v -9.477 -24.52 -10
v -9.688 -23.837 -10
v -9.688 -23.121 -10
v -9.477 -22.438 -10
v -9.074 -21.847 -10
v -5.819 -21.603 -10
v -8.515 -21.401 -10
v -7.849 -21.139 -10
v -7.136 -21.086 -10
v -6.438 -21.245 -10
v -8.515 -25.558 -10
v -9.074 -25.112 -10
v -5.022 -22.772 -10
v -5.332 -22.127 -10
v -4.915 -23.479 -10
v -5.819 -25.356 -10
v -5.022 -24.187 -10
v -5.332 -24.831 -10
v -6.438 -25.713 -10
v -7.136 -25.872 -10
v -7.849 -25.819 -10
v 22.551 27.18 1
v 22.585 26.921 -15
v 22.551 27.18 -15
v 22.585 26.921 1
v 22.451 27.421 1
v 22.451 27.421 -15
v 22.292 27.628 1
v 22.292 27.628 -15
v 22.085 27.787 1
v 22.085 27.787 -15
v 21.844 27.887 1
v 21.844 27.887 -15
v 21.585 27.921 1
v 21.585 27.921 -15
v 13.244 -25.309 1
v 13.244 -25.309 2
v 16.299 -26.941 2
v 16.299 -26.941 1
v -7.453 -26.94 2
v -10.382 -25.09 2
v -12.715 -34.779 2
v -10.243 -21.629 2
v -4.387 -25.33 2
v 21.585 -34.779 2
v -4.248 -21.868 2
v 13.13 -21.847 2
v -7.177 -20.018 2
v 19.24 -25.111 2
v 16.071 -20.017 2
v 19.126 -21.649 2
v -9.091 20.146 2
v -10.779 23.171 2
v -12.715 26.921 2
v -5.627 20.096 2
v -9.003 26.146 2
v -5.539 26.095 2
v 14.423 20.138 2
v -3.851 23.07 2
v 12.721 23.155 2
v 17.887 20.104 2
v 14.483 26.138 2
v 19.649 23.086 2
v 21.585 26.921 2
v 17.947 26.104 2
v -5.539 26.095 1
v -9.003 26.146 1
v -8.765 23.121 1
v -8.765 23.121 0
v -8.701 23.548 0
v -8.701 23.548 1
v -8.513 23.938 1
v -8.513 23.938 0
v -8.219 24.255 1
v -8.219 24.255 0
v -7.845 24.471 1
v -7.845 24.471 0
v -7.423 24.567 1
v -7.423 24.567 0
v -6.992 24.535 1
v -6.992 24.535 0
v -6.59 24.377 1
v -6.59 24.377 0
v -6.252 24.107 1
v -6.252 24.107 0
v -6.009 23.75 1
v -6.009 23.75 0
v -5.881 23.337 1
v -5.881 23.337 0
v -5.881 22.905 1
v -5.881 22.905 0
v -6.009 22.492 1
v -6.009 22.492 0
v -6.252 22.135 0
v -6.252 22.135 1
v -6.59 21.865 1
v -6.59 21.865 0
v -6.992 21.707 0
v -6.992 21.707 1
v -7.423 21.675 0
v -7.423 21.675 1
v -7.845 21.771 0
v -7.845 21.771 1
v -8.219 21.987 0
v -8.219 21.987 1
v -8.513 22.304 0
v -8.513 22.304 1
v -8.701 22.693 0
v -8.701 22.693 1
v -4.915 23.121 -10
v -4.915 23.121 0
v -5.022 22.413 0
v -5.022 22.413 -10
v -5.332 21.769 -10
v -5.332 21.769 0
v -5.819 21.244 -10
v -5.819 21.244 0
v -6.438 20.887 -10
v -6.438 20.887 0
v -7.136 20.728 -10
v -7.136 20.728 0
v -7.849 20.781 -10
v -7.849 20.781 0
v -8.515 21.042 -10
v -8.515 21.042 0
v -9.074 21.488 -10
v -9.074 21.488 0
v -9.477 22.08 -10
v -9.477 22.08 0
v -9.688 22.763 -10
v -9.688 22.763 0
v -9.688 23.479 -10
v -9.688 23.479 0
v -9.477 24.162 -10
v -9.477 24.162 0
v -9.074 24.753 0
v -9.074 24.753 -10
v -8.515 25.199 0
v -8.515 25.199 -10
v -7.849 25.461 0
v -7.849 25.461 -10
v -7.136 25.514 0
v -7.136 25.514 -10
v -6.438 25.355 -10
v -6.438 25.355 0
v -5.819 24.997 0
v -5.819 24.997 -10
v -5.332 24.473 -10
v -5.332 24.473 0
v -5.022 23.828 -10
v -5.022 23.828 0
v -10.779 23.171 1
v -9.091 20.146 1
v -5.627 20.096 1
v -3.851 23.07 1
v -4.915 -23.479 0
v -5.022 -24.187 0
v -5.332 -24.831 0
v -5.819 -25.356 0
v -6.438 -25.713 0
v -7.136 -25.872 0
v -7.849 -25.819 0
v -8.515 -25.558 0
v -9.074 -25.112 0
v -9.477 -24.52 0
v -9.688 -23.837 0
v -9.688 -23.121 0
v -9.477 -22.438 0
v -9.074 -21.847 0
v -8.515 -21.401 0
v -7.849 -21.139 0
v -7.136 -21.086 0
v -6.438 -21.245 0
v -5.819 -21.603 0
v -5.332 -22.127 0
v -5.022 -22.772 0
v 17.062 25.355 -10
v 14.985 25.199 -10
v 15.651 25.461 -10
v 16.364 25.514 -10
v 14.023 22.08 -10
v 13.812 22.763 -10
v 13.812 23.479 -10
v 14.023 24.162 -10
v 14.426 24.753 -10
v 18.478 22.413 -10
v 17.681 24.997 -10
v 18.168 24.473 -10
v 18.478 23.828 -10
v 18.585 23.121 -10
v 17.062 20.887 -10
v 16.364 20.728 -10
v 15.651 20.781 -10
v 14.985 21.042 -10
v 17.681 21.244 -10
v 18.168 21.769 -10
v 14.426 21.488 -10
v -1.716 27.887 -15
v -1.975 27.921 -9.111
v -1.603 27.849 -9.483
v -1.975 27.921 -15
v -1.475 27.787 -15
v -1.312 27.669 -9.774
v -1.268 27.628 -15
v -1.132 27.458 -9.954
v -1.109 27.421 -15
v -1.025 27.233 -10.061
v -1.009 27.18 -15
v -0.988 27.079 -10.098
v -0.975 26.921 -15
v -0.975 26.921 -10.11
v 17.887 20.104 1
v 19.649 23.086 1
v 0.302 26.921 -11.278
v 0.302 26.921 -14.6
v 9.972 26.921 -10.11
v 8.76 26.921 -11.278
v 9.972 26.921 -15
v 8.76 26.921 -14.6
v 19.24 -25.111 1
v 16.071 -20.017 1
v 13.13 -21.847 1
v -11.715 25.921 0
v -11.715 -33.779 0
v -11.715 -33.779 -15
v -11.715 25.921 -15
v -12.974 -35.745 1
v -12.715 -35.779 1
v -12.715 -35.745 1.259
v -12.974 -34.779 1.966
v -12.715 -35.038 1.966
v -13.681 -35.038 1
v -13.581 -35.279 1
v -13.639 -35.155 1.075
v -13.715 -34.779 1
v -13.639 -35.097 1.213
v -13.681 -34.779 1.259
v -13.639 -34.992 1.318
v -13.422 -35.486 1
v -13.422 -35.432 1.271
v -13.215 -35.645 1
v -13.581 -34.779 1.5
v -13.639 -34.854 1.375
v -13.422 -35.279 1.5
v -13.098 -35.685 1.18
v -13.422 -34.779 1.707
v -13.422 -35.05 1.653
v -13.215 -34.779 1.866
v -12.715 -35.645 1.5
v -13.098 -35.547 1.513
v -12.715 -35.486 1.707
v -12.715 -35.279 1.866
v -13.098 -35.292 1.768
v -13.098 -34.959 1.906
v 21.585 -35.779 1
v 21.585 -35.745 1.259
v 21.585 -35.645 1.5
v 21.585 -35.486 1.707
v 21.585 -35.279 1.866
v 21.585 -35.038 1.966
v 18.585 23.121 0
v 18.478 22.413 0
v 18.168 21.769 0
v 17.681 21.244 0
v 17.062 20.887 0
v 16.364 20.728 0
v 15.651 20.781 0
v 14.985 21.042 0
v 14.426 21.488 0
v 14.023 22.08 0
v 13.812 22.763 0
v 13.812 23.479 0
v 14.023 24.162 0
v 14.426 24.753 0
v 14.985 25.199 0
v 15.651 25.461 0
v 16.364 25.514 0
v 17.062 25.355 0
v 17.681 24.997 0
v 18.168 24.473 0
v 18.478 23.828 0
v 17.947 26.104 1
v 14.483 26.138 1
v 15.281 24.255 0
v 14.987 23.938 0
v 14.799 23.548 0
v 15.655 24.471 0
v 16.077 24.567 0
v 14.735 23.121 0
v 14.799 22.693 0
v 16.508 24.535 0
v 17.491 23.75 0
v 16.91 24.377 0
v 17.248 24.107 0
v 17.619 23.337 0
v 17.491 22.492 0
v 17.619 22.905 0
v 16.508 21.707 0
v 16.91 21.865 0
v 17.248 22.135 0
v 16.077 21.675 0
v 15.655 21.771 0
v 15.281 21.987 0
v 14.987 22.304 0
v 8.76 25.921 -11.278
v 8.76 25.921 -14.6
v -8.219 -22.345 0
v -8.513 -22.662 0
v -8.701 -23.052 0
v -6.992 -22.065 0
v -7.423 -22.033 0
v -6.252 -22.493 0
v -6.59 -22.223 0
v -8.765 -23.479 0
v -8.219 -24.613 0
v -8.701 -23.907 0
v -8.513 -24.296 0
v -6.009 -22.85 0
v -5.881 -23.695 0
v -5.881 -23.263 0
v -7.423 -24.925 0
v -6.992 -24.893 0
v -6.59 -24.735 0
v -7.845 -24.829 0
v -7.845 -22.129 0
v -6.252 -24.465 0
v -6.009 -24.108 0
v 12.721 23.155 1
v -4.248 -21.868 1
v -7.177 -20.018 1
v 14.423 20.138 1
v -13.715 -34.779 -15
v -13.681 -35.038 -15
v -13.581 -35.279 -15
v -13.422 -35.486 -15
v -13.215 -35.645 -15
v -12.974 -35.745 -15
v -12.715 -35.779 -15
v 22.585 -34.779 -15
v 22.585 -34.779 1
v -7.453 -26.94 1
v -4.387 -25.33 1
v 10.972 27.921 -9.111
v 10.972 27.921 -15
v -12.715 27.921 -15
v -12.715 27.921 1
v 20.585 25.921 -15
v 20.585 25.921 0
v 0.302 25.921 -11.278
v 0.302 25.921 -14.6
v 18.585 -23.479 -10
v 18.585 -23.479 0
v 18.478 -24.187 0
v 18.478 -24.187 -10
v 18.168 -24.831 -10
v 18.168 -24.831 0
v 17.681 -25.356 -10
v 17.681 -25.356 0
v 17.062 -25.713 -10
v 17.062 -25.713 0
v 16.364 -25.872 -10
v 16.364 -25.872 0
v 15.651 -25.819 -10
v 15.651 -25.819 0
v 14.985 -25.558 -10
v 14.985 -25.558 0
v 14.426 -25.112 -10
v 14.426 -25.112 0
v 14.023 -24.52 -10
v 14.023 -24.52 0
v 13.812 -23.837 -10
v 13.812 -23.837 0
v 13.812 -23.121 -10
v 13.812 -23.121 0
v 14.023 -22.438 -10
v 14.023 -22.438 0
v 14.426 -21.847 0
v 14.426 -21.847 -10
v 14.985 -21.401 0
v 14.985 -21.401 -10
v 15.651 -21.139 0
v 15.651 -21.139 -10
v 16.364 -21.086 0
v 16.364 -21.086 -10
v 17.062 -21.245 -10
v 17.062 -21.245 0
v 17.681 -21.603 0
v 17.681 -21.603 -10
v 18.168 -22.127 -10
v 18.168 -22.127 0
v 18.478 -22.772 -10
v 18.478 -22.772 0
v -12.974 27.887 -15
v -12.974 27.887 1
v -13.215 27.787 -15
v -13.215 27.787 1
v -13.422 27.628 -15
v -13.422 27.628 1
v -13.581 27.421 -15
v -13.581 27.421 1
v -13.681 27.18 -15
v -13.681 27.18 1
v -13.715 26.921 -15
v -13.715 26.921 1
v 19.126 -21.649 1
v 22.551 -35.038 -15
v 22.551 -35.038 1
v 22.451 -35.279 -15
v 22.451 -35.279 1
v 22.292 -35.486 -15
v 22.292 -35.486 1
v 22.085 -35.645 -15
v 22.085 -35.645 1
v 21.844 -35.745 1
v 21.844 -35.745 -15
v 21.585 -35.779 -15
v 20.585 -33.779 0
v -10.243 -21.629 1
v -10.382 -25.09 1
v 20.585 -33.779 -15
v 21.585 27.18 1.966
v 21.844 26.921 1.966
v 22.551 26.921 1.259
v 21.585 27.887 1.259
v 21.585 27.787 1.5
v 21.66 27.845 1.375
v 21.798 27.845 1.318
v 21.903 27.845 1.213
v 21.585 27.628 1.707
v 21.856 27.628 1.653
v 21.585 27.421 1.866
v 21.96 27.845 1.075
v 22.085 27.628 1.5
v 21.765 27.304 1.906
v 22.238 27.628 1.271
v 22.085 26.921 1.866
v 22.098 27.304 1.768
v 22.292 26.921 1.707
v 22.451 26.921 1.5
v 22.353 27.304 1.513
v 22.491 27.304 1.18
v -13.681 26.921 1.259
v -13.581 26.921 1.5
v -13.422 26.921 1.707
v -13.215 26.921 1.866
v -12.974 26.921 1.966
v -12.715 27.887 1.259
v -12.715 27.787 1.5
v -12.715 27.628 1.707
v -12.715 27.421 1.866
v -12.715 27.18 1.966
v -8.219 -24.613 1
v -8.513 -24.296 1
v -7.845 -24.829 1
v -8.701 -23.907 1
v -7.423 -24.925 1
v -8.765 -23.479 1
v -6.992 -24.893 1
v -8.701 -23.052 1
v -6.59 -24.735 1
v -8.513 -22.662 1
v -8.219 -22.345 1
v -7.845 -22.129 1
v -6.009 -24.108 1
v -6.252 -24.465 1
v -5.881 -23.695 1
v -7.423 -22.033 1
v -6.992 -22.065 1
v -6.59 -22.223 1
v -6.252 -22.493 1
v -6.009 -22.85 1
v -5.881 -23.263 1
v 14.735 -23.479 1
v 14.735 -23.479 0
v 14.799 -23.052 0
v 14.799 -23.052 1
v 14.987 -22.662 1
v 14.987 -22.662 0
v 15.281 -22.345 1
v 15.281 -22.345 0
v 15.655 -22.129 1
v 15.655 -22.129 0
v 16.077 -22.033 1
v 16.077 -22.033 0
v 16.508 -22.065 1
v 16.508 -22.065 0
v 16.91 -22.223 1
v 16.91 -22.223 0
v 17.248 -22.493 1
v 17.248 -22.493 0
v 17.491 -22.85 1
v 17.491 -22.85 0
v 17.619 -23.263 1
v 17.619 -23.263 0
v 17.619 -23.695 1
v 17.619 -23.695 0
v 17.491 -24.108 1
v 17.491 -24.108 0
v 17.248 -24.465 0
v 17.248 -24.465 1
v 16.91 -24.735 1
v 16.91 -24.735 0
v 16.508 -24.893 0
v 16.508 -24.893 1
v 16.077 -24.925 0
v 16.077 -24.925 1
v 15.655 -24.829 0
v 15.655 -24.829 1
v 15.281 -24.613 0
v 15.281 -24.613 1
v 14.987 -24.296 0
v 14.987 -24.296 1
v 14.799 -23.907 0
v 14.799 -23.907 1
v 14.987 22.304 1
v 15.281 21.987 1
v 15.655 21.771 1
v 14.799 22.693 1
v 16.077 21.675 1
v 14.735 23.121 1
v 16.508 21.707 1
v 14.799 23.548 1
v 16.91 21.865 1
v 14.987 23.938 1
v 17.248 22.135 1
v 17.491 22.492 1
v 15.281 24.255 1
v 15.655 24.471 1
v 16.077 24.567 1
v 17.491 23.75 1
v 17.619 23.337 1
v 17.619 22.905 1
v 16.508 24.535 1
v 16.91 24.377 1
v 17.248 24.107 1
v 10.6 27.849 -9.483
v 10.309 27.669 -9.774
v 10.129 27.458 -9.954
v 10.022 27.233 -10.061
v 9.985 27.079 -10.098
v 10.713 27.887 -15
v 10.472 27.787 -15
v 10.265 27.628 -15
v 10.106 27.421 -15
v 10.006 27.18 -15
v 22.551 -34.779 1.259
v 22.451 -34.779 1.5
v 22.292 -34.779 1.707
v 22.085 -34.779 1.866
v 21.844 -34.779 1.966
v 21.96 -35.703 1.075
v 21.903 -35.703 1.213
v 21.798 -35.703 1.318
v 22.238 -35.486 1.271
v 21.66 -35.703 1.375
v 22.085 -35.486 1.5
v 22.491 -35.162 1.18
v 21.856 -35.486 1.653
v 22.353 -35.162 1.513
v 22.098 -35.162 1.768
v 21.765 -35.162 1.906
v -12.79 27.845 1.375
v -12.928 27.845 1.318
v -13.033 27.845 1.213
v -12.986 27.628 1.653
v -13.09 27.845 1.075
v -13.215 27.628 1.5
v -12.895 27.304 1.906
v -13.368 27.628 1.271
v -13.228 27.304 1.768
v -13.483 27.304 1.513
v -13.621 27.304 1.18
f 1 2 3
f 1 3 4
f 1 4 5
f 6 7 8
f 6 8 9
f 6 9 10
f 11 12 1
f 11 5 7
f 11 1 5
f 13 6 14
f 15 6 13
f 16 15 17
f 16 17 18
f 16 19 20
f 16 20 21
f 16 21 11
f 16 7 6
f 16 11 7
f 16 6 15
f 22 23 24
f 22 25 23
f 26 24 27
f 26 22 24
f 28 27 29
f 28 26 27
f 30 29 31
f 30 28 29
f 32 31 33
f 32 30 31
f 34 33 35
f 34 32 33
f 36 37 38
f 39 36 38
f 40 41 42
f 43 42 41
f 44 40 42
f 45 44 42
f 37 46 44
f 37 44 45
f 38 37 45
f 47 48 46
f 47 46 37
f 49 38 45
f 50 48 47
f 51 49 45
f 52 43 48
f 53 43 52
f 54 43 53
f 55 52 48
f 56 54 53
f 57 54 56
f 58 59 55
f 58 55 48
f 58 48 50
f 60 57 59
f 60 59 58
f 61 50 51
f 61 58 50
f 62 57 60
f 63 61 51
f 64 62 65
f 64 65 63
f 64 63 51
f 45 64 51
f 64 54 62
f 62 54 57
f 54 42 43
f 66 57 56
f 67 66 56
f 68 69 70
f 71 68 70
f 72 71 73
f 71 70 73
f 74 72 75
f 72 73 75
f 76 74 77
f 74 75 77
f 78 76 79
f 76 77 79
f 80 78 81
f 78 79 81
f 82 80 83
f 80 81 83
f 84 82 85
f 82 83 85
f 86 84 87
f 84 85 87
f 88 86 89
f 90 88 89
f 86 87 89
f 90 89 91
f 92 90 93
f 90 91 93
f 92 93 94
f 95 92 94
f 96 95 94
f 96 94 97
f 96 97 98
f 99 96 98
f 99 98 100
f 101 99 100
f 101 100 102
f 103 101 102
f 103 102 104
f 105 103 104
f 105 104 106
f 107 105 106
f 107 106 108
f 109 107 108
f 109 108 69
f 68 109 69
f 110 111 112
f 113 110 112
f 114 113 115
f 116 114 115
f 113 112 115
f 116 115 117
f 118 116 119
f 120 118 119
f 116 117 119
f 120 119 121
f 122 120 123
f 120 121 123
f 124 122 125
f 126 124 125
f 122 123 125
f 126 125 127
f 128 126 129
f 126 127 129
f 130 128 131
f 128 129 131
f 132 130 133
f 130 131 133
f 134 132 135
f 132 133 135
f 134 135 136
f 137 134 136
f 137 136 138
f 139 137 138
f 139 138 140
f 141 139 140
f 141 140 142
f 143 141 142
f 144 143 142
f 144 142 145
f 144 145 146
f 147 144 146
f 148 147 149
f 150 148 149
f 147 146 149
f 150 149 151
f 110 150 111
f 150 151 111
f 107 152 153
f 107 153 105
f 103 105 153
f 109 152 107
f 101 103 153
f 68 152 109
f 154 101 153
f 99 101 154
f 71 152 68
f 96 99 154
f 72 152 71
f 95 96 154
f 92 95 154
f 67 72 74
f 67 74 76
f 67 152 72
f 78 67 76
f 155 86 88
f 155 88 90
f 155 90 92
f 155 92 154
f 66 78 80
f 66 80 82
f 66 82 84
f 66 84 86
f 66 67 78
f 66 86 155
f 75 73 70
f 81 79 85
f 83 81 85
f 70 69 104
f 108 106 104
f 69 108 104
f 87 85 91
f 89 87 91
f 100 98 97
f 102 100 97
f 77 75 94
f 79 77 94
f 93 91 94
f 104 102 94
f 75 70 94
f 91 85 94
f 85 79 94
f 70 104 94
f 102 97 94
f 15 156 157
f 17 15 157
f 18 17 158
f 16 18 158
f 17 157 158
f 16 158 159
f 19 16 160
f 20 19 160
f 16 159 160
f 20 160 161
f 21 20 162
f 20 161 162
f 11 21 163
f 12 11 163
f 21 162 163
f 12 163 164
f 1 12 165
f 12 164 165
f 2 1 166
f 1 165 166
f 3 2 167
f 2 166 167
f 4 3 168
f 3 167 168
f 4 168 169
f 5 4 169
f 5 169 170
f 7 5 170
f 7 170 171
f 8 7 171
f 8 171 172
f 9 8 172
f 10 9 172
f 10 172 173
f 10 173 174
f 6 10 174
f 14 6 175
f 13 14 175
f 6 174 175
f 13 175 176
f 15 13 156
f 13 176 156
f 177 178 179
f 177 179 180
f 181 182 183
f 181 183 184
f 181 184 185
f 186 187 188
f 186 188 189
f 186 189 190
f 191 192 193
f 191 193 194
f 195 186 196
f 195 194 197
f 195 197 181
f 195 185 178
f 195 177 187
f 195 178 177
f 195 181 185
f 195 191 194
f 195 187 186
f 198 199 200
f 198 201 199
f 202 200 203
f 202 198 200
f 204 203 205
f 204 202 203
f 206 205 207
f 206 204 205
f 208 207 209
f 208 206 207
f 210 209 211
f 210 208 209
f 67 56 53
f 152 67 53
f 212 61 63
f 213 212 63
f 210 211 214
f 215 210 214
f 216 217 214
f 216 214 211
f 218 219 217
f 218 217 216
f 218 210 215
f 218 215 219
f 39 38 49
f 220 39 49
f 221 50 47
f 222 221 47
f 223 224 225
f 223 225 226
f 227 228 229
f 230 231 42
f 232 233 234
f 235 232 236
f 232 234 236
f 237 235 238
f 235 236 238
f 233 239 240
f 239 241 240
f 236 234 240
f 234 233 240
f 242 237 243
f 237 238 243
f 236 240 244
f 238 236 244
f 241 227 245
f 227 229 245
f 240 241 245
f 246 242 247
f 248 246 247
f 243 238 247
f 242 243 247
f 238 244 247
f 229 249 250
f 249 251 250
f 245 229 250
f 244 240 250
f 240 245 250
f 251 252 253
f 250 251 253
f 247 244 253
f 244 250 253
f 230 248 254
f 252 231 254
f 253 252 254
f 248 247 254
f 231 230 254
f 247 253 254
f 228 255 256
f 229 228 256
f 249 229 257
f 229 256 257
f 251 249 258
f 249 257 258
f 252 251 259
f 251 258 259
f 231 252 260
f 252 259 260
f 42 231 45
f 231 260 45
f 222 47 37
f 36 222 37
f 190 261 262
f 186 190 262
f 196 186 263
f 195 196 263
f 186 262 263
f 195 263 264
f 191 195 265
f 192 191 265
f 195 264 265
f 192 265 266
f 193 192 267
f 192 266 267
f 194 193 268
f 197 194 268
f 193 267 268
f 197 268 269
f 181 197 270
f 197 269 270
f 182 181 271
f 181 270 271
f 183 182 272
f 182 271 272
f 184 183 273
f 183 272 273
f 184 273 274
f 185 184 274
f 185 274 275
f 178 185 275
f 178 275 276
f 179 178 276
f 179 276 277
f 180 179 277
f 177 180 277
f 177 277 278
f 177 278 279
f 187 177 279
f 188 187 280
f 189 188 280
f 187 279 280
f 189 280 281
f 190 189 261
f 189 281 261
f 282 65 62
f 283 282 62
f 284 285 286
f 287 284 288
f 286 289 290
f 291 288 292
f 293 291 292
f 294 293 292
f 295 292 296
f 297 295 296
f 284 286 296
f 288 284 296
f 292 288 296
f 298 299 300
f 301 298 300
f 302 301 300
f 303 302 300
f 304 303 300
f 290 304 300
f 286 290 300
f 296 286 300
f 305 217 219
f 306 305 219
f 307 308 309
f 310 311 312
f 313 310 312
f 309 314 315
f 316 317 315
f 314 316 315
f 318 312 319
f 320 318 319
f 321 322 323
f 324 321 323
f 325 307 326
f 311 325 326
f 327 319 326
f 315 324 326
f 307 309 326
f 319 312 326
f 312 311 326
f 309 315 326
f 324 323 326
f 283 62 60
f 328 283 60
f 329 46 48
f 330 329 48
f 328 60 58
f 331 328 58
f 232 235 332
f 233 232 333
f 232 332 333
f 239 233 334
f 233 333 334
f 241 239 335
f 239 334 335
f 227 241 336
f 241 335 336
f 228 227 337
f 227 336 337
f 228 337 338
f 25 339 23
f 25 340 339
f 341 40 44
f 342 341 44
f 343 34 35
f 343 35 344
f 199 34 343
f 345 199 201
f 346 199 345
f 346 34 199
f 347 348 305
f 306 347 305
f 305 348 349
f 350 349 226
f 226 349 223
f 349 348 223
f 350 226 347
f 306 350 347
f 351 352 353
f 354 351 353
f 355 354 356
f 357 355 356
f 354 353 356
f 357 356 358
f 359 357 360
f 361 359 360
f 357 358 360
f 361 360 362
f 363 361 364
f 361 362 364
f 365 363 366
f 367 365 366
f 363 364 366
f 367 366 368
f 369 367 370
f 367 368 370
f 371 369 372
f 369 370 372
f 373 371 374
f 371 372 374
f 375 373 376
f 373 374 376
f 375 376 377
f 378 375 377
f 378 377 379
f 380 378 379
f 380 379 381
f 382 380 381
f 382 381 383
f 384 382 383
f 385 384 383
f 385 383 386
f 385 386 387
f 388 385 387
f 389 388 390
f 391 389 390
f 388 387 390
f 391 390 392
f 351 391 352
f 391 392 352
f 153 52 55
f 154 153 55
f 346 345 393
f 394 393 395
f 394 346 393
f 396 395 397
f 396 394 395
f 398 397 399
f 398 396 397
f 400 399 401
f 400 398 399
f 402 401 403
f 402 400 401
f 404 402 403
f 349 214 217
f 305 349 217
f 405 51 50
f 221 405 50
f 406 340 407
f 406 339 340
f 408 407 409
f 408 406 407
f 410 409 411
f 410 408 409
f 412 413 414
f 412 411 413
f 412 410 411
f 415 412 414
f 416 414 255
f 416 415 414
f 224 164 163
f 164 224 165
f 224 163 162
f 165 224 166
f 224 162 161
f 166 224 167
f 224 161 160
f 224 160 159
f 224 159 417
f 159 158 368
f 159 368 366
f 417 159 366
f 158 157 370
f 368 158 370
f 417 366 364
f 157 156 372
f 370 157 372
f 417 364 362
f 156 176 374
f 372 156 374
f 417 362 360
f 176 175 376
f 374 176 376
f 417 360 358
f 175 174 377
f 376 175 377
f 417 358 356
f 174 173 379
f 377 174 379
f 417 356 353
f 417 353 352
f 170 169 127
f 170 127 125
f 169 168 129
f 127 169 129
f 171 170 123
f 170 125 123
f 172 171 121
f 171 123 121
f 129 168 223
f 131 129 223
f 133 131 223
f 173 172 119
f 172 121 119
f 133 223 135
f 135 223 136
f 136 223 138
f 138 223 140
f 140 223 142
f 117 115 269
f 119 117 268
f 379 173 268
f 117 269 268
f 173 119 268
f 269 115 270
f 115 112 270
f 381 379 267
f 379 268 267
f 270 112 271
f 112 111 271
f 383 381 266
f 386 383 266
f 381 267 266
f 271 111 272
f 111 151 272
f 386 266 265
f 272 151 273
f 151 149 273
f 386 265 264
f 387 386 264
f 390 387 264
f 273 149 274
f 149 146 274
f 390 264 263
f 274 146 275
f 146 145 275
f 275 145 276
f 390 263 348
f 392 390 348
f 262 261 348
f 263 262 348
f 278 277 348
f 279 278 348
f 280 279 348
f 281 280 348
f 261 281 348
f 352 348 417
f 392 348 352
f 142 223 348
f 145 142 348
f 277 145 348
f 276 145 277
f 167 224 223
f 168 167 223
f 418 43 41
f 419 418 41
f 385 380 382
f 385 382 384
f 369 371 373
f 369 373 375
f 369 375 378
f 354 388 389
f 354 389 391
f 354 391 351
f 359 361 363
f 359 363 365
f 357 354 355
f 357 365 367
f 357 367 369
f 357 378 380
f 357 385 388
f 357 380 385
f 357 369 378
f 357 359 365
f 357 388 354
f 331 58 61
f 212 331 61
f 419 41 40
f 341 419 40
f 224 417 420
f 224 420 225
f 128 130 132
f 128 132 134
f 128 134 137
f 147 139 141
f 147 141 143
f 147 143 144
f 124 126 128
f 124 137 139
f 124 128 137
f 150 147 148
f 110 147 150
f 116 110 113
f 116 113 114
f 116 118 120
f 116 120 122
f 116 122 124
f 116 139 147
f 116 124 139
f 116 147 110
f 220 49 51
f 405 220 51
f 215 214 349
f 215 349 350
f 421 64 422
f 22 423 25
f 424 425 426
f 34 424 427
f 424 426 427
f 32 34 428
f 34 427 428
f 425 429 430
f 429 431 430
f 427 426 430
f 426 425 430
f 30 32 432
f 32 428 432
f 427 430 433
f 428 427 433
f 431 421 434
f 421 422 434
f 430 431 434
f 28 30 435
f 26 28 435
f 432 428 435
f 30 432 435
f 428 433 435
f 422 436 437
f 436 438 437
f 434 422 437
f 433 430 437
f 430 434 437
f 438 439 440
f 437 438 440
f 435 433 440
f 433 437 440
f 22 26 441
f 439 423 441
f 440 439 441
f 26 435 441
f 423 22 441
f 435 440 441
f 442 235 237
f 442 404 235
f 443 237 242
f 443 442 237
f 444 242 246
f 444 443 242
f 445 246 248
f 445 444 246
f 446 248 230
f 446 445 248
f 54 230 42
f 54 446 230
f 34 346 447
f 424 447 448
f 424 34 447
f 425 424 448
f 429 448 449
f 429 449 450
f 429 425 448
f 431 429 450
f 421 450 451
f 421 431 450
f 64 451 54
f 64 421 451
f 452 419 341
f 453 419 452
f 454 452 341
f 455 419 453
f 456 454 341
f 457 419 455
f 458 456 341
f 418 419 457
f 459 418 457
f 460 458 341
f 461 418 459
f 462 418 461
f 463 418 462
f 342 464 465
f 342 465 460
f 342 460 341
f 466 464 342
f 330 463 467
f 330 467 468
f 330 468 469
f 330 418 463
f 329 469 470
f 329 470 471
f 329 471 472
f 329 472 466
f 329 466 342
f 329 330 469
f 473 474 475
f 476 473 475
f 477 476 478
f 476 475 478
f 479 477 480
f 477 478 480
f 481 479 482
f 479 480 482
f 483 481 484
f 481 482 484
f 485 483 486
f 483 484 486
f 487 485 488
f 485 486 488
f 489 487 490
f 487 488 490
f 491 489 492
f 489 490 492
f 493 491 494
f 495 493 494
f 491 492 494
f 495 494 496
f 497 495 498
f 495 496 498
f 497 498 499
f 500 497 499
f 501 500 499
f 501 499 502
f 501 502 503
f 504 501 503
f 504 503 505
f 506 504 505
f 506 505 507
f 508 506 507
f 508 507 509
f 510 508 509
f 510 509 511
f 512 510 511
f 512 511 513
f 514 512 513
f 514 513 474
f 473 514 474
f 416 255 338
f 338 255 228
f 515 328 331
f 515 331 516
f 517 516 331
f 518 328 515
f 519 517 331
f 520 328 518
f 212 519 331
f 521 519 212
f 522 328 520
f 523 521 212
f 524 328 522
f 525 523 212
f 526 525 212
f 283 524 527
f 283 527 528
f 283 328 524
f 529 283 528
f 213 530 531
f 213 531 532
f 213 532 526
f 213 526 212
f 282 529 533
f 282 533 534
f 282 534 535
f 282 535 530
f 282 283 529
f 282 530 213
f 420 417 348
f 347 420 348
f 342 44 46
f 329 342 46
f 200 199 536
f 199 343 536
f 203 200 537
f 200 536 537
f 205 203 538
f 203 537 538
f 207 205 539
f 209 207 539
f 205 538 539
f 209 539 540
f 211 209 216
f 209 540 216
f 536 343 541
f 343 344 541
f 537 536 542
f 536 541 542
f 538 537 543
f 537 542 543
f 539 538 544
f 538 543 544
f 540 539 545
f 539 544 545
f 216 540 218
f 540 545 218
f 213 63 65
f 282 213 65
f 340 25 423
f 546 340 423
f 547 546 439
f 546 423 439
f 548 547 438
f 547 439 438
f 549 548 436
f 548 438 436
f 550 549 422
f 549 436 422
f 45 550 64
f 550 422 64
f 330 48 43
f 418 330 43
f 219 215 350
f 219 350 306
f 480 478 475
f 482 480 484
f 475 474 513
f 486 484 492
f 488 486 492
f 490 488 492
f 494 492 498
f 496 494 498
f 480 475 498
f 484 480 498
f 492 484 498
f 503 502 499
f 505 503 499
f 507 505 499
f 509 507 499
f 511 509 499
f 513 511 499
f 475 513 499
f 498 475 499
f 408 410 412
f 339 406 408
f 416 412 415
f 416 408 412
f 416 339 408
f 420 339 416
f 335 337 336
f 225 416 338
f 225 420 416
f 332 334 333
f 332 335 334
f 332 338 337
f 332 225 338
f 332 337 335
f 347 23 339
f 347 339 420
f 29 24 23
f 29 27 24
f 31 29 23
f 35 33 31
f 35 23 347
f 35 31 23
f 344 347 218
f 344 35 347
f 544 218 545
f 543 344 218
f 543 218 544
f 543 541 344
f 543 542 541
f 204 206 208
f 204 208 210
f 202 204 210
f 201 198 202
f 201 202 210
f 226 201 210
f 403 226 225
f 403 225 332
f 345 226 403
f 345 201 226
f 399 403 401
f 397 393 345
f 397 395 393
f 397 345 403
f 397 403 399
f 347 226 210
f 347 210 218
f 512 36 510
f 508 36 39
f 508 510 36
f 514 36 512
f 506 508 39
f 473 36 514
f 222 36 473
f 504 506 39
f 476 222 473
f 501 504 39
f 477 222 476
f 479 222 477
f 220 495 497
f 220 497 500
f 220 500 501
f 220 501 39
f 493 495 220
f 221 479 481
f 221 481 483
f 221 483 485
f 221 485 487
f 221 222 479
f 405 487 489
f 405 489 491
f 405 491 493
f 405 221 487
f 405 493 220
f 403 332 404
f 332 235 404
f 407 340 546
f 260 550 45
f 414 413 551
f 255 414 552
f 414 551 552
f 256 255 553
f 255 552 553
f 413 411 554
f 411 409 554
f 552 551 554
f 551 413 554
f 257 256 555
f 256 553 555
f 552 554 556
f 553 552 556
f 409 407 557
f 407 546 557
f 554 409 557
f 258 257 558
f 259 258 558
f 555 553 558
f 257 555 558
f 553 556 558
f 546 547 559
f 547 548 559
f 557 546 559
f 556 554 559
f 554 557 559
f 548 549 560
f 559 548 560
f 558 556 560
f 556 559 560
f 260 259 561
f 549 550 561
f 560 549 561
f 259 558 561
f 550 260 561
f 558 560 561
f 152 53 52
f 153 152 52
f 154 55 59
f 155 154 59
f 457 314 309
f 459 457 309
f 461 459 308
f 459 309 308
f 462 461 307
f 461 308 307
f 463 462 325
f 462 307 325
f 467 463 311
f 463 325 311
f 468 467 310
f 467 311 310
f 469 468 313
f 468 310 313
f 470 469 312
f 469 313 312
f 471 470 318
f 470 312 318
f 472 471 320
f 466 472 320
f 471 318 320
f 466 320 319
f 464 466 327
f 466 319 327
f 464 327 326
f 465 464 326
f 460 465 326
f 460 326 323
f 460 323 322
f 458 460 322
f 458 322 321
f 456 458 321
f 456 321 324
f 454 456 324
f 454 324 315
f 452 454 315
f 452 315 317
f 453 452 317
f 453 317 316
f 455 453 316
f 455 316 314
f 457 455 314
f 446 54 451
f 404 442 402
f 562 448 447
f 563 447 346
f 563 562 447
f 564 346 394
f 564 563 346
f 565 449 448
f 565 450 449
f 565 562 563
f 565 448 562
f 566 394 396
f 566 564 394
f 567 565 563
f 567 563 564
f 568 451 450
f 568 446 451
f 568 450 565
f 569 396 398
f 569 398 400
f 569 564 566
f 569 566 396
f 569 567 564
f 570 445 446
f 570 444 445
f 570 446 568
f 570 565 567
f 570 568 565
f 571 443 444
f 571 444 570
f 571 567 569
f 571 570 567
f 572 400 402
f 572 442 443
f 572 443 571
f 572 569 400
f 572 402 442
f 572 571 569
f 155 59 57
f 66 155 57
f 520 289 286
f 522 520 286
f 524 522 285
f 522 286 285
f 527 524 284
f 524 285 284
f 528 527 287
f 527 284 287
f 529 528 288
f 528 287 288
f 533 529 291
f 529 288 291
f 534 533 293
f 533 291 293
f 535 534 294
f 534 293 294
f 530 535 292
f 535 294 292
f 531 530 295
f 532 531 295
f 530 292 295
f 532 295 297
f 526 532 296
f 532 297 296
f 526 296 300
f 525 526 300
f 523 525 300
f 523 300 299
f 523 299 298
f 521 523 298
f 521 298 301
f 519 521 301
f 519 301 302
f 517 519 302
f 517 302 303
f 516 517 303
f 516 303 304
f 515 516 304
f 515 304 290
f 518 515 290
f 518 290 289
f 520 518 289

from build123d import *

# Parameters (mm, degrees)
CROQUIS1_W              = 36.3
CROQUIS1_H              = 63.7
SALIENTE_EXTRUIR1_DEPTH = 2
CROQUIS2_R              = 1.45
CORTAR_EXTRUIR1_DEPTH   = 43.35833467
CROQUIS3_W              = 36.3
CROQUIS3_H              = 63.7
CROQUIS3_W_2            = 32.3
CROQUIS3_H_2            = 59.7
SALIENTE_EXTRUIR2_DEPTH = 15
CROQUIS4_W              = 8.458215844
CROQUIS4_H              = 3.322323253
CORTAR_EXTRUIR2_DEPTH   = 15
CROQUIS5_W              = 10.947551138
CROQUIS5_H              = 4.889557179
CORTAR_EXTRUIR3_DEPTH   = 1
CROQUIS6_R              = 2.4
SALIENTE_EXTRUIR3_DEPTH = 10
REDONDEO1_R             = 1
CORTAR_EXTRUIR4_DEPTH   = 1


with BuildPart() as part:
    # Croquis1 → Saliente-Extruir1 (new body)
    with BuildSketch(Plane.XY):
        with Locations((4.435020115, -3.929119363)):
            Rectangle(CROQUIS1_W, CROQUIS1_H)
    extrude(amount=SALIENTE_EXTRUIR1_DEPTH)

    # Croquis2 → Cortar-Extruir1 (cut, through all)
    with BuildSketch(Plane(origin=(0, 0, 0), x_dir=(-1, 0, 0), z_dir=(0, 0, -1))):
        with Locations((-16.185020115, 23.120880637)):
            Circle(CROQUIS2_R)
        with Locations((7.314979885, 23.120880637)):
            Circle(CROQUIS2_R)
        with Locations((7.314979885, -23.479119363)):
            Circle(CROQUIS2_R)
        with Locations((-16.185020115, -23.479119363)):
            Circle(CROQUIS2_R)
    extrude(amount=-CORTAR_EXTRUIR1_DEPTH, mode=Mode.SUBTRACT)

    # Croquis3 → Saliente-Extruir2 (add)
    with BuildSketch(Plane(origin=(0, 0, 0), x_dir=(-1, 0, 0), z_dir=(0, 0, -1))):
        with Locations((-4.435020115, -3.929119363)):
            Rectangle(CROQUIS3_W, CROQUIS3_H)
        with Locations((-4.435020115, -3.929119363)):
            Rectangle(CROQUIS3_W_2, CROQUIS3_H_2, mode=Mode.SUBTRACT)
    extrude(amount=SALIENTE_EXTRUIR2_DEPTH)

    # Croquis4 → Cortar-Extruir2 (cut)
    with BuildSketch(Plane(origin=(0, 27.920880637, 0), x_dir=(1, 0, 0), z_dir=(0, 1, 0))):
        with Locations((4.530912193, 12.938838374)):
            Rectangle(CROQUIS4_W, CROQUIS4_H)
    extrude(amount=-CORTAR_EXTRUIR2_DEPTH, mode=Mode.SUBTRACT)

    # Croquis5 → Cortar-Extruir3 (cut)
    with BuildSketch(Plane(origin=(0, 27.920880637, 0), x_dir=(1, 0, 0), z_dir=(0, 1, 0))):
        with Locations((4.498418707, 12.555221411)):
            Rectangle(CROQUIS5_W, CROQUIS5_H)
    extrude(amount=-CORTAR_EXTRUIR3_DEPTH, mode=Mode.SUBTRACT)

    # Croquis6 → Saliente-Extruir3 (add)
    with BuildSketch(Plane(origin=(0, 0, 0), x_dir=(-1, 0, 0), z_dir=(0, 0, -1))):
        with Locations(Location((-16.185020115, 23.120880637, 0), (0, 0, 180))):
            Circle(CROQUIS6_R)
        with Locations(Location((7.314979885, 23.120880637, 0), (0, 0, 180))):
            Circle(CROQUIS6_R)
        with Locations(Location((7.314979885, -23.479119363, 0), (0, 0, 180))):
            Circle(CROQUIS6_R)
        with Locations(Location((-16.185020115, -23.479119363, 0), (0, 0, 180))):
            Circle(CROQUIS6_R)
    extrude(amount=SALIENTE_EXTRUIR3_DEPTH)

    # Redondeo1
    redondeo1_edges = [part.edges().sort_by_distance(p)[0] for p in [
        (-0.975356862, 27.920880637, -12.55522141),
        (4.498418707, 27.920880637, -10.110442821),
        (9.972194276, 27.920880637, -12.55522141),
        (22.585020115, -3.929119363, 2),
        (22.585020115, -35.779119363, -6.5),
        (4.435020115, -35.779119363, 2),
        (-13.714979885, -35.779119363, -6.5),
        (-13.714979885, -3.929119363, 2),
        (4.435020115, 27.920880637, 2),
        (-13.714979885, 27.920880637, -6.5),
        (22.585020115, 27.920880637, -6.5),
    ]]
    fillet(redondeo1_edges, radius=REDONDEO1_R - 0.0001)  # a hair under: the kernel refuses the full size

    # Croquis7 → Cortar-Extruir4 (cut)
    with BuildSketch(Plane.XY.offset(2)):
        Polygon((-5.626866213, 20.095938946), (-3.8512467, 23.070359116), (-5.539360372, 26.095300806), (-9.003093557, 26.145822327), (-10.77871307, 23.171402157), (-9.090599398, 20.146460467), align=None)
        Polygon((17.887203126, 20.103833571), (19.648951024, 23.086490833), (17.946768013, 26.103537899), (14.482837104, 26.137927702), (12.721089206, 23.15527044), (14.423272217, 20.138223374), align=None)
        Polygon((-4.386581268, -25.329654838), (-4.248169845, -21.868319506), (-7.176568462, -20.017784032), (-10.243378502, -21.628583889), (-10.381789925, -25.089919221), (-7.453391308, -26.940454695), align=None)
        Polygon((19.240442153, -25.111417183), (19.126342512, -21.649195169), (16.070920474, -20.01689735), (13.129598077, -21.846821544), (13.243697718, -25.309043558), (16.299119756, -26.941341377), align=None)
    extrude(amount=-CORTAR_EXTRUIR4_DEPTH, mode=Mode.SUBTRACT)


solid = part.part
